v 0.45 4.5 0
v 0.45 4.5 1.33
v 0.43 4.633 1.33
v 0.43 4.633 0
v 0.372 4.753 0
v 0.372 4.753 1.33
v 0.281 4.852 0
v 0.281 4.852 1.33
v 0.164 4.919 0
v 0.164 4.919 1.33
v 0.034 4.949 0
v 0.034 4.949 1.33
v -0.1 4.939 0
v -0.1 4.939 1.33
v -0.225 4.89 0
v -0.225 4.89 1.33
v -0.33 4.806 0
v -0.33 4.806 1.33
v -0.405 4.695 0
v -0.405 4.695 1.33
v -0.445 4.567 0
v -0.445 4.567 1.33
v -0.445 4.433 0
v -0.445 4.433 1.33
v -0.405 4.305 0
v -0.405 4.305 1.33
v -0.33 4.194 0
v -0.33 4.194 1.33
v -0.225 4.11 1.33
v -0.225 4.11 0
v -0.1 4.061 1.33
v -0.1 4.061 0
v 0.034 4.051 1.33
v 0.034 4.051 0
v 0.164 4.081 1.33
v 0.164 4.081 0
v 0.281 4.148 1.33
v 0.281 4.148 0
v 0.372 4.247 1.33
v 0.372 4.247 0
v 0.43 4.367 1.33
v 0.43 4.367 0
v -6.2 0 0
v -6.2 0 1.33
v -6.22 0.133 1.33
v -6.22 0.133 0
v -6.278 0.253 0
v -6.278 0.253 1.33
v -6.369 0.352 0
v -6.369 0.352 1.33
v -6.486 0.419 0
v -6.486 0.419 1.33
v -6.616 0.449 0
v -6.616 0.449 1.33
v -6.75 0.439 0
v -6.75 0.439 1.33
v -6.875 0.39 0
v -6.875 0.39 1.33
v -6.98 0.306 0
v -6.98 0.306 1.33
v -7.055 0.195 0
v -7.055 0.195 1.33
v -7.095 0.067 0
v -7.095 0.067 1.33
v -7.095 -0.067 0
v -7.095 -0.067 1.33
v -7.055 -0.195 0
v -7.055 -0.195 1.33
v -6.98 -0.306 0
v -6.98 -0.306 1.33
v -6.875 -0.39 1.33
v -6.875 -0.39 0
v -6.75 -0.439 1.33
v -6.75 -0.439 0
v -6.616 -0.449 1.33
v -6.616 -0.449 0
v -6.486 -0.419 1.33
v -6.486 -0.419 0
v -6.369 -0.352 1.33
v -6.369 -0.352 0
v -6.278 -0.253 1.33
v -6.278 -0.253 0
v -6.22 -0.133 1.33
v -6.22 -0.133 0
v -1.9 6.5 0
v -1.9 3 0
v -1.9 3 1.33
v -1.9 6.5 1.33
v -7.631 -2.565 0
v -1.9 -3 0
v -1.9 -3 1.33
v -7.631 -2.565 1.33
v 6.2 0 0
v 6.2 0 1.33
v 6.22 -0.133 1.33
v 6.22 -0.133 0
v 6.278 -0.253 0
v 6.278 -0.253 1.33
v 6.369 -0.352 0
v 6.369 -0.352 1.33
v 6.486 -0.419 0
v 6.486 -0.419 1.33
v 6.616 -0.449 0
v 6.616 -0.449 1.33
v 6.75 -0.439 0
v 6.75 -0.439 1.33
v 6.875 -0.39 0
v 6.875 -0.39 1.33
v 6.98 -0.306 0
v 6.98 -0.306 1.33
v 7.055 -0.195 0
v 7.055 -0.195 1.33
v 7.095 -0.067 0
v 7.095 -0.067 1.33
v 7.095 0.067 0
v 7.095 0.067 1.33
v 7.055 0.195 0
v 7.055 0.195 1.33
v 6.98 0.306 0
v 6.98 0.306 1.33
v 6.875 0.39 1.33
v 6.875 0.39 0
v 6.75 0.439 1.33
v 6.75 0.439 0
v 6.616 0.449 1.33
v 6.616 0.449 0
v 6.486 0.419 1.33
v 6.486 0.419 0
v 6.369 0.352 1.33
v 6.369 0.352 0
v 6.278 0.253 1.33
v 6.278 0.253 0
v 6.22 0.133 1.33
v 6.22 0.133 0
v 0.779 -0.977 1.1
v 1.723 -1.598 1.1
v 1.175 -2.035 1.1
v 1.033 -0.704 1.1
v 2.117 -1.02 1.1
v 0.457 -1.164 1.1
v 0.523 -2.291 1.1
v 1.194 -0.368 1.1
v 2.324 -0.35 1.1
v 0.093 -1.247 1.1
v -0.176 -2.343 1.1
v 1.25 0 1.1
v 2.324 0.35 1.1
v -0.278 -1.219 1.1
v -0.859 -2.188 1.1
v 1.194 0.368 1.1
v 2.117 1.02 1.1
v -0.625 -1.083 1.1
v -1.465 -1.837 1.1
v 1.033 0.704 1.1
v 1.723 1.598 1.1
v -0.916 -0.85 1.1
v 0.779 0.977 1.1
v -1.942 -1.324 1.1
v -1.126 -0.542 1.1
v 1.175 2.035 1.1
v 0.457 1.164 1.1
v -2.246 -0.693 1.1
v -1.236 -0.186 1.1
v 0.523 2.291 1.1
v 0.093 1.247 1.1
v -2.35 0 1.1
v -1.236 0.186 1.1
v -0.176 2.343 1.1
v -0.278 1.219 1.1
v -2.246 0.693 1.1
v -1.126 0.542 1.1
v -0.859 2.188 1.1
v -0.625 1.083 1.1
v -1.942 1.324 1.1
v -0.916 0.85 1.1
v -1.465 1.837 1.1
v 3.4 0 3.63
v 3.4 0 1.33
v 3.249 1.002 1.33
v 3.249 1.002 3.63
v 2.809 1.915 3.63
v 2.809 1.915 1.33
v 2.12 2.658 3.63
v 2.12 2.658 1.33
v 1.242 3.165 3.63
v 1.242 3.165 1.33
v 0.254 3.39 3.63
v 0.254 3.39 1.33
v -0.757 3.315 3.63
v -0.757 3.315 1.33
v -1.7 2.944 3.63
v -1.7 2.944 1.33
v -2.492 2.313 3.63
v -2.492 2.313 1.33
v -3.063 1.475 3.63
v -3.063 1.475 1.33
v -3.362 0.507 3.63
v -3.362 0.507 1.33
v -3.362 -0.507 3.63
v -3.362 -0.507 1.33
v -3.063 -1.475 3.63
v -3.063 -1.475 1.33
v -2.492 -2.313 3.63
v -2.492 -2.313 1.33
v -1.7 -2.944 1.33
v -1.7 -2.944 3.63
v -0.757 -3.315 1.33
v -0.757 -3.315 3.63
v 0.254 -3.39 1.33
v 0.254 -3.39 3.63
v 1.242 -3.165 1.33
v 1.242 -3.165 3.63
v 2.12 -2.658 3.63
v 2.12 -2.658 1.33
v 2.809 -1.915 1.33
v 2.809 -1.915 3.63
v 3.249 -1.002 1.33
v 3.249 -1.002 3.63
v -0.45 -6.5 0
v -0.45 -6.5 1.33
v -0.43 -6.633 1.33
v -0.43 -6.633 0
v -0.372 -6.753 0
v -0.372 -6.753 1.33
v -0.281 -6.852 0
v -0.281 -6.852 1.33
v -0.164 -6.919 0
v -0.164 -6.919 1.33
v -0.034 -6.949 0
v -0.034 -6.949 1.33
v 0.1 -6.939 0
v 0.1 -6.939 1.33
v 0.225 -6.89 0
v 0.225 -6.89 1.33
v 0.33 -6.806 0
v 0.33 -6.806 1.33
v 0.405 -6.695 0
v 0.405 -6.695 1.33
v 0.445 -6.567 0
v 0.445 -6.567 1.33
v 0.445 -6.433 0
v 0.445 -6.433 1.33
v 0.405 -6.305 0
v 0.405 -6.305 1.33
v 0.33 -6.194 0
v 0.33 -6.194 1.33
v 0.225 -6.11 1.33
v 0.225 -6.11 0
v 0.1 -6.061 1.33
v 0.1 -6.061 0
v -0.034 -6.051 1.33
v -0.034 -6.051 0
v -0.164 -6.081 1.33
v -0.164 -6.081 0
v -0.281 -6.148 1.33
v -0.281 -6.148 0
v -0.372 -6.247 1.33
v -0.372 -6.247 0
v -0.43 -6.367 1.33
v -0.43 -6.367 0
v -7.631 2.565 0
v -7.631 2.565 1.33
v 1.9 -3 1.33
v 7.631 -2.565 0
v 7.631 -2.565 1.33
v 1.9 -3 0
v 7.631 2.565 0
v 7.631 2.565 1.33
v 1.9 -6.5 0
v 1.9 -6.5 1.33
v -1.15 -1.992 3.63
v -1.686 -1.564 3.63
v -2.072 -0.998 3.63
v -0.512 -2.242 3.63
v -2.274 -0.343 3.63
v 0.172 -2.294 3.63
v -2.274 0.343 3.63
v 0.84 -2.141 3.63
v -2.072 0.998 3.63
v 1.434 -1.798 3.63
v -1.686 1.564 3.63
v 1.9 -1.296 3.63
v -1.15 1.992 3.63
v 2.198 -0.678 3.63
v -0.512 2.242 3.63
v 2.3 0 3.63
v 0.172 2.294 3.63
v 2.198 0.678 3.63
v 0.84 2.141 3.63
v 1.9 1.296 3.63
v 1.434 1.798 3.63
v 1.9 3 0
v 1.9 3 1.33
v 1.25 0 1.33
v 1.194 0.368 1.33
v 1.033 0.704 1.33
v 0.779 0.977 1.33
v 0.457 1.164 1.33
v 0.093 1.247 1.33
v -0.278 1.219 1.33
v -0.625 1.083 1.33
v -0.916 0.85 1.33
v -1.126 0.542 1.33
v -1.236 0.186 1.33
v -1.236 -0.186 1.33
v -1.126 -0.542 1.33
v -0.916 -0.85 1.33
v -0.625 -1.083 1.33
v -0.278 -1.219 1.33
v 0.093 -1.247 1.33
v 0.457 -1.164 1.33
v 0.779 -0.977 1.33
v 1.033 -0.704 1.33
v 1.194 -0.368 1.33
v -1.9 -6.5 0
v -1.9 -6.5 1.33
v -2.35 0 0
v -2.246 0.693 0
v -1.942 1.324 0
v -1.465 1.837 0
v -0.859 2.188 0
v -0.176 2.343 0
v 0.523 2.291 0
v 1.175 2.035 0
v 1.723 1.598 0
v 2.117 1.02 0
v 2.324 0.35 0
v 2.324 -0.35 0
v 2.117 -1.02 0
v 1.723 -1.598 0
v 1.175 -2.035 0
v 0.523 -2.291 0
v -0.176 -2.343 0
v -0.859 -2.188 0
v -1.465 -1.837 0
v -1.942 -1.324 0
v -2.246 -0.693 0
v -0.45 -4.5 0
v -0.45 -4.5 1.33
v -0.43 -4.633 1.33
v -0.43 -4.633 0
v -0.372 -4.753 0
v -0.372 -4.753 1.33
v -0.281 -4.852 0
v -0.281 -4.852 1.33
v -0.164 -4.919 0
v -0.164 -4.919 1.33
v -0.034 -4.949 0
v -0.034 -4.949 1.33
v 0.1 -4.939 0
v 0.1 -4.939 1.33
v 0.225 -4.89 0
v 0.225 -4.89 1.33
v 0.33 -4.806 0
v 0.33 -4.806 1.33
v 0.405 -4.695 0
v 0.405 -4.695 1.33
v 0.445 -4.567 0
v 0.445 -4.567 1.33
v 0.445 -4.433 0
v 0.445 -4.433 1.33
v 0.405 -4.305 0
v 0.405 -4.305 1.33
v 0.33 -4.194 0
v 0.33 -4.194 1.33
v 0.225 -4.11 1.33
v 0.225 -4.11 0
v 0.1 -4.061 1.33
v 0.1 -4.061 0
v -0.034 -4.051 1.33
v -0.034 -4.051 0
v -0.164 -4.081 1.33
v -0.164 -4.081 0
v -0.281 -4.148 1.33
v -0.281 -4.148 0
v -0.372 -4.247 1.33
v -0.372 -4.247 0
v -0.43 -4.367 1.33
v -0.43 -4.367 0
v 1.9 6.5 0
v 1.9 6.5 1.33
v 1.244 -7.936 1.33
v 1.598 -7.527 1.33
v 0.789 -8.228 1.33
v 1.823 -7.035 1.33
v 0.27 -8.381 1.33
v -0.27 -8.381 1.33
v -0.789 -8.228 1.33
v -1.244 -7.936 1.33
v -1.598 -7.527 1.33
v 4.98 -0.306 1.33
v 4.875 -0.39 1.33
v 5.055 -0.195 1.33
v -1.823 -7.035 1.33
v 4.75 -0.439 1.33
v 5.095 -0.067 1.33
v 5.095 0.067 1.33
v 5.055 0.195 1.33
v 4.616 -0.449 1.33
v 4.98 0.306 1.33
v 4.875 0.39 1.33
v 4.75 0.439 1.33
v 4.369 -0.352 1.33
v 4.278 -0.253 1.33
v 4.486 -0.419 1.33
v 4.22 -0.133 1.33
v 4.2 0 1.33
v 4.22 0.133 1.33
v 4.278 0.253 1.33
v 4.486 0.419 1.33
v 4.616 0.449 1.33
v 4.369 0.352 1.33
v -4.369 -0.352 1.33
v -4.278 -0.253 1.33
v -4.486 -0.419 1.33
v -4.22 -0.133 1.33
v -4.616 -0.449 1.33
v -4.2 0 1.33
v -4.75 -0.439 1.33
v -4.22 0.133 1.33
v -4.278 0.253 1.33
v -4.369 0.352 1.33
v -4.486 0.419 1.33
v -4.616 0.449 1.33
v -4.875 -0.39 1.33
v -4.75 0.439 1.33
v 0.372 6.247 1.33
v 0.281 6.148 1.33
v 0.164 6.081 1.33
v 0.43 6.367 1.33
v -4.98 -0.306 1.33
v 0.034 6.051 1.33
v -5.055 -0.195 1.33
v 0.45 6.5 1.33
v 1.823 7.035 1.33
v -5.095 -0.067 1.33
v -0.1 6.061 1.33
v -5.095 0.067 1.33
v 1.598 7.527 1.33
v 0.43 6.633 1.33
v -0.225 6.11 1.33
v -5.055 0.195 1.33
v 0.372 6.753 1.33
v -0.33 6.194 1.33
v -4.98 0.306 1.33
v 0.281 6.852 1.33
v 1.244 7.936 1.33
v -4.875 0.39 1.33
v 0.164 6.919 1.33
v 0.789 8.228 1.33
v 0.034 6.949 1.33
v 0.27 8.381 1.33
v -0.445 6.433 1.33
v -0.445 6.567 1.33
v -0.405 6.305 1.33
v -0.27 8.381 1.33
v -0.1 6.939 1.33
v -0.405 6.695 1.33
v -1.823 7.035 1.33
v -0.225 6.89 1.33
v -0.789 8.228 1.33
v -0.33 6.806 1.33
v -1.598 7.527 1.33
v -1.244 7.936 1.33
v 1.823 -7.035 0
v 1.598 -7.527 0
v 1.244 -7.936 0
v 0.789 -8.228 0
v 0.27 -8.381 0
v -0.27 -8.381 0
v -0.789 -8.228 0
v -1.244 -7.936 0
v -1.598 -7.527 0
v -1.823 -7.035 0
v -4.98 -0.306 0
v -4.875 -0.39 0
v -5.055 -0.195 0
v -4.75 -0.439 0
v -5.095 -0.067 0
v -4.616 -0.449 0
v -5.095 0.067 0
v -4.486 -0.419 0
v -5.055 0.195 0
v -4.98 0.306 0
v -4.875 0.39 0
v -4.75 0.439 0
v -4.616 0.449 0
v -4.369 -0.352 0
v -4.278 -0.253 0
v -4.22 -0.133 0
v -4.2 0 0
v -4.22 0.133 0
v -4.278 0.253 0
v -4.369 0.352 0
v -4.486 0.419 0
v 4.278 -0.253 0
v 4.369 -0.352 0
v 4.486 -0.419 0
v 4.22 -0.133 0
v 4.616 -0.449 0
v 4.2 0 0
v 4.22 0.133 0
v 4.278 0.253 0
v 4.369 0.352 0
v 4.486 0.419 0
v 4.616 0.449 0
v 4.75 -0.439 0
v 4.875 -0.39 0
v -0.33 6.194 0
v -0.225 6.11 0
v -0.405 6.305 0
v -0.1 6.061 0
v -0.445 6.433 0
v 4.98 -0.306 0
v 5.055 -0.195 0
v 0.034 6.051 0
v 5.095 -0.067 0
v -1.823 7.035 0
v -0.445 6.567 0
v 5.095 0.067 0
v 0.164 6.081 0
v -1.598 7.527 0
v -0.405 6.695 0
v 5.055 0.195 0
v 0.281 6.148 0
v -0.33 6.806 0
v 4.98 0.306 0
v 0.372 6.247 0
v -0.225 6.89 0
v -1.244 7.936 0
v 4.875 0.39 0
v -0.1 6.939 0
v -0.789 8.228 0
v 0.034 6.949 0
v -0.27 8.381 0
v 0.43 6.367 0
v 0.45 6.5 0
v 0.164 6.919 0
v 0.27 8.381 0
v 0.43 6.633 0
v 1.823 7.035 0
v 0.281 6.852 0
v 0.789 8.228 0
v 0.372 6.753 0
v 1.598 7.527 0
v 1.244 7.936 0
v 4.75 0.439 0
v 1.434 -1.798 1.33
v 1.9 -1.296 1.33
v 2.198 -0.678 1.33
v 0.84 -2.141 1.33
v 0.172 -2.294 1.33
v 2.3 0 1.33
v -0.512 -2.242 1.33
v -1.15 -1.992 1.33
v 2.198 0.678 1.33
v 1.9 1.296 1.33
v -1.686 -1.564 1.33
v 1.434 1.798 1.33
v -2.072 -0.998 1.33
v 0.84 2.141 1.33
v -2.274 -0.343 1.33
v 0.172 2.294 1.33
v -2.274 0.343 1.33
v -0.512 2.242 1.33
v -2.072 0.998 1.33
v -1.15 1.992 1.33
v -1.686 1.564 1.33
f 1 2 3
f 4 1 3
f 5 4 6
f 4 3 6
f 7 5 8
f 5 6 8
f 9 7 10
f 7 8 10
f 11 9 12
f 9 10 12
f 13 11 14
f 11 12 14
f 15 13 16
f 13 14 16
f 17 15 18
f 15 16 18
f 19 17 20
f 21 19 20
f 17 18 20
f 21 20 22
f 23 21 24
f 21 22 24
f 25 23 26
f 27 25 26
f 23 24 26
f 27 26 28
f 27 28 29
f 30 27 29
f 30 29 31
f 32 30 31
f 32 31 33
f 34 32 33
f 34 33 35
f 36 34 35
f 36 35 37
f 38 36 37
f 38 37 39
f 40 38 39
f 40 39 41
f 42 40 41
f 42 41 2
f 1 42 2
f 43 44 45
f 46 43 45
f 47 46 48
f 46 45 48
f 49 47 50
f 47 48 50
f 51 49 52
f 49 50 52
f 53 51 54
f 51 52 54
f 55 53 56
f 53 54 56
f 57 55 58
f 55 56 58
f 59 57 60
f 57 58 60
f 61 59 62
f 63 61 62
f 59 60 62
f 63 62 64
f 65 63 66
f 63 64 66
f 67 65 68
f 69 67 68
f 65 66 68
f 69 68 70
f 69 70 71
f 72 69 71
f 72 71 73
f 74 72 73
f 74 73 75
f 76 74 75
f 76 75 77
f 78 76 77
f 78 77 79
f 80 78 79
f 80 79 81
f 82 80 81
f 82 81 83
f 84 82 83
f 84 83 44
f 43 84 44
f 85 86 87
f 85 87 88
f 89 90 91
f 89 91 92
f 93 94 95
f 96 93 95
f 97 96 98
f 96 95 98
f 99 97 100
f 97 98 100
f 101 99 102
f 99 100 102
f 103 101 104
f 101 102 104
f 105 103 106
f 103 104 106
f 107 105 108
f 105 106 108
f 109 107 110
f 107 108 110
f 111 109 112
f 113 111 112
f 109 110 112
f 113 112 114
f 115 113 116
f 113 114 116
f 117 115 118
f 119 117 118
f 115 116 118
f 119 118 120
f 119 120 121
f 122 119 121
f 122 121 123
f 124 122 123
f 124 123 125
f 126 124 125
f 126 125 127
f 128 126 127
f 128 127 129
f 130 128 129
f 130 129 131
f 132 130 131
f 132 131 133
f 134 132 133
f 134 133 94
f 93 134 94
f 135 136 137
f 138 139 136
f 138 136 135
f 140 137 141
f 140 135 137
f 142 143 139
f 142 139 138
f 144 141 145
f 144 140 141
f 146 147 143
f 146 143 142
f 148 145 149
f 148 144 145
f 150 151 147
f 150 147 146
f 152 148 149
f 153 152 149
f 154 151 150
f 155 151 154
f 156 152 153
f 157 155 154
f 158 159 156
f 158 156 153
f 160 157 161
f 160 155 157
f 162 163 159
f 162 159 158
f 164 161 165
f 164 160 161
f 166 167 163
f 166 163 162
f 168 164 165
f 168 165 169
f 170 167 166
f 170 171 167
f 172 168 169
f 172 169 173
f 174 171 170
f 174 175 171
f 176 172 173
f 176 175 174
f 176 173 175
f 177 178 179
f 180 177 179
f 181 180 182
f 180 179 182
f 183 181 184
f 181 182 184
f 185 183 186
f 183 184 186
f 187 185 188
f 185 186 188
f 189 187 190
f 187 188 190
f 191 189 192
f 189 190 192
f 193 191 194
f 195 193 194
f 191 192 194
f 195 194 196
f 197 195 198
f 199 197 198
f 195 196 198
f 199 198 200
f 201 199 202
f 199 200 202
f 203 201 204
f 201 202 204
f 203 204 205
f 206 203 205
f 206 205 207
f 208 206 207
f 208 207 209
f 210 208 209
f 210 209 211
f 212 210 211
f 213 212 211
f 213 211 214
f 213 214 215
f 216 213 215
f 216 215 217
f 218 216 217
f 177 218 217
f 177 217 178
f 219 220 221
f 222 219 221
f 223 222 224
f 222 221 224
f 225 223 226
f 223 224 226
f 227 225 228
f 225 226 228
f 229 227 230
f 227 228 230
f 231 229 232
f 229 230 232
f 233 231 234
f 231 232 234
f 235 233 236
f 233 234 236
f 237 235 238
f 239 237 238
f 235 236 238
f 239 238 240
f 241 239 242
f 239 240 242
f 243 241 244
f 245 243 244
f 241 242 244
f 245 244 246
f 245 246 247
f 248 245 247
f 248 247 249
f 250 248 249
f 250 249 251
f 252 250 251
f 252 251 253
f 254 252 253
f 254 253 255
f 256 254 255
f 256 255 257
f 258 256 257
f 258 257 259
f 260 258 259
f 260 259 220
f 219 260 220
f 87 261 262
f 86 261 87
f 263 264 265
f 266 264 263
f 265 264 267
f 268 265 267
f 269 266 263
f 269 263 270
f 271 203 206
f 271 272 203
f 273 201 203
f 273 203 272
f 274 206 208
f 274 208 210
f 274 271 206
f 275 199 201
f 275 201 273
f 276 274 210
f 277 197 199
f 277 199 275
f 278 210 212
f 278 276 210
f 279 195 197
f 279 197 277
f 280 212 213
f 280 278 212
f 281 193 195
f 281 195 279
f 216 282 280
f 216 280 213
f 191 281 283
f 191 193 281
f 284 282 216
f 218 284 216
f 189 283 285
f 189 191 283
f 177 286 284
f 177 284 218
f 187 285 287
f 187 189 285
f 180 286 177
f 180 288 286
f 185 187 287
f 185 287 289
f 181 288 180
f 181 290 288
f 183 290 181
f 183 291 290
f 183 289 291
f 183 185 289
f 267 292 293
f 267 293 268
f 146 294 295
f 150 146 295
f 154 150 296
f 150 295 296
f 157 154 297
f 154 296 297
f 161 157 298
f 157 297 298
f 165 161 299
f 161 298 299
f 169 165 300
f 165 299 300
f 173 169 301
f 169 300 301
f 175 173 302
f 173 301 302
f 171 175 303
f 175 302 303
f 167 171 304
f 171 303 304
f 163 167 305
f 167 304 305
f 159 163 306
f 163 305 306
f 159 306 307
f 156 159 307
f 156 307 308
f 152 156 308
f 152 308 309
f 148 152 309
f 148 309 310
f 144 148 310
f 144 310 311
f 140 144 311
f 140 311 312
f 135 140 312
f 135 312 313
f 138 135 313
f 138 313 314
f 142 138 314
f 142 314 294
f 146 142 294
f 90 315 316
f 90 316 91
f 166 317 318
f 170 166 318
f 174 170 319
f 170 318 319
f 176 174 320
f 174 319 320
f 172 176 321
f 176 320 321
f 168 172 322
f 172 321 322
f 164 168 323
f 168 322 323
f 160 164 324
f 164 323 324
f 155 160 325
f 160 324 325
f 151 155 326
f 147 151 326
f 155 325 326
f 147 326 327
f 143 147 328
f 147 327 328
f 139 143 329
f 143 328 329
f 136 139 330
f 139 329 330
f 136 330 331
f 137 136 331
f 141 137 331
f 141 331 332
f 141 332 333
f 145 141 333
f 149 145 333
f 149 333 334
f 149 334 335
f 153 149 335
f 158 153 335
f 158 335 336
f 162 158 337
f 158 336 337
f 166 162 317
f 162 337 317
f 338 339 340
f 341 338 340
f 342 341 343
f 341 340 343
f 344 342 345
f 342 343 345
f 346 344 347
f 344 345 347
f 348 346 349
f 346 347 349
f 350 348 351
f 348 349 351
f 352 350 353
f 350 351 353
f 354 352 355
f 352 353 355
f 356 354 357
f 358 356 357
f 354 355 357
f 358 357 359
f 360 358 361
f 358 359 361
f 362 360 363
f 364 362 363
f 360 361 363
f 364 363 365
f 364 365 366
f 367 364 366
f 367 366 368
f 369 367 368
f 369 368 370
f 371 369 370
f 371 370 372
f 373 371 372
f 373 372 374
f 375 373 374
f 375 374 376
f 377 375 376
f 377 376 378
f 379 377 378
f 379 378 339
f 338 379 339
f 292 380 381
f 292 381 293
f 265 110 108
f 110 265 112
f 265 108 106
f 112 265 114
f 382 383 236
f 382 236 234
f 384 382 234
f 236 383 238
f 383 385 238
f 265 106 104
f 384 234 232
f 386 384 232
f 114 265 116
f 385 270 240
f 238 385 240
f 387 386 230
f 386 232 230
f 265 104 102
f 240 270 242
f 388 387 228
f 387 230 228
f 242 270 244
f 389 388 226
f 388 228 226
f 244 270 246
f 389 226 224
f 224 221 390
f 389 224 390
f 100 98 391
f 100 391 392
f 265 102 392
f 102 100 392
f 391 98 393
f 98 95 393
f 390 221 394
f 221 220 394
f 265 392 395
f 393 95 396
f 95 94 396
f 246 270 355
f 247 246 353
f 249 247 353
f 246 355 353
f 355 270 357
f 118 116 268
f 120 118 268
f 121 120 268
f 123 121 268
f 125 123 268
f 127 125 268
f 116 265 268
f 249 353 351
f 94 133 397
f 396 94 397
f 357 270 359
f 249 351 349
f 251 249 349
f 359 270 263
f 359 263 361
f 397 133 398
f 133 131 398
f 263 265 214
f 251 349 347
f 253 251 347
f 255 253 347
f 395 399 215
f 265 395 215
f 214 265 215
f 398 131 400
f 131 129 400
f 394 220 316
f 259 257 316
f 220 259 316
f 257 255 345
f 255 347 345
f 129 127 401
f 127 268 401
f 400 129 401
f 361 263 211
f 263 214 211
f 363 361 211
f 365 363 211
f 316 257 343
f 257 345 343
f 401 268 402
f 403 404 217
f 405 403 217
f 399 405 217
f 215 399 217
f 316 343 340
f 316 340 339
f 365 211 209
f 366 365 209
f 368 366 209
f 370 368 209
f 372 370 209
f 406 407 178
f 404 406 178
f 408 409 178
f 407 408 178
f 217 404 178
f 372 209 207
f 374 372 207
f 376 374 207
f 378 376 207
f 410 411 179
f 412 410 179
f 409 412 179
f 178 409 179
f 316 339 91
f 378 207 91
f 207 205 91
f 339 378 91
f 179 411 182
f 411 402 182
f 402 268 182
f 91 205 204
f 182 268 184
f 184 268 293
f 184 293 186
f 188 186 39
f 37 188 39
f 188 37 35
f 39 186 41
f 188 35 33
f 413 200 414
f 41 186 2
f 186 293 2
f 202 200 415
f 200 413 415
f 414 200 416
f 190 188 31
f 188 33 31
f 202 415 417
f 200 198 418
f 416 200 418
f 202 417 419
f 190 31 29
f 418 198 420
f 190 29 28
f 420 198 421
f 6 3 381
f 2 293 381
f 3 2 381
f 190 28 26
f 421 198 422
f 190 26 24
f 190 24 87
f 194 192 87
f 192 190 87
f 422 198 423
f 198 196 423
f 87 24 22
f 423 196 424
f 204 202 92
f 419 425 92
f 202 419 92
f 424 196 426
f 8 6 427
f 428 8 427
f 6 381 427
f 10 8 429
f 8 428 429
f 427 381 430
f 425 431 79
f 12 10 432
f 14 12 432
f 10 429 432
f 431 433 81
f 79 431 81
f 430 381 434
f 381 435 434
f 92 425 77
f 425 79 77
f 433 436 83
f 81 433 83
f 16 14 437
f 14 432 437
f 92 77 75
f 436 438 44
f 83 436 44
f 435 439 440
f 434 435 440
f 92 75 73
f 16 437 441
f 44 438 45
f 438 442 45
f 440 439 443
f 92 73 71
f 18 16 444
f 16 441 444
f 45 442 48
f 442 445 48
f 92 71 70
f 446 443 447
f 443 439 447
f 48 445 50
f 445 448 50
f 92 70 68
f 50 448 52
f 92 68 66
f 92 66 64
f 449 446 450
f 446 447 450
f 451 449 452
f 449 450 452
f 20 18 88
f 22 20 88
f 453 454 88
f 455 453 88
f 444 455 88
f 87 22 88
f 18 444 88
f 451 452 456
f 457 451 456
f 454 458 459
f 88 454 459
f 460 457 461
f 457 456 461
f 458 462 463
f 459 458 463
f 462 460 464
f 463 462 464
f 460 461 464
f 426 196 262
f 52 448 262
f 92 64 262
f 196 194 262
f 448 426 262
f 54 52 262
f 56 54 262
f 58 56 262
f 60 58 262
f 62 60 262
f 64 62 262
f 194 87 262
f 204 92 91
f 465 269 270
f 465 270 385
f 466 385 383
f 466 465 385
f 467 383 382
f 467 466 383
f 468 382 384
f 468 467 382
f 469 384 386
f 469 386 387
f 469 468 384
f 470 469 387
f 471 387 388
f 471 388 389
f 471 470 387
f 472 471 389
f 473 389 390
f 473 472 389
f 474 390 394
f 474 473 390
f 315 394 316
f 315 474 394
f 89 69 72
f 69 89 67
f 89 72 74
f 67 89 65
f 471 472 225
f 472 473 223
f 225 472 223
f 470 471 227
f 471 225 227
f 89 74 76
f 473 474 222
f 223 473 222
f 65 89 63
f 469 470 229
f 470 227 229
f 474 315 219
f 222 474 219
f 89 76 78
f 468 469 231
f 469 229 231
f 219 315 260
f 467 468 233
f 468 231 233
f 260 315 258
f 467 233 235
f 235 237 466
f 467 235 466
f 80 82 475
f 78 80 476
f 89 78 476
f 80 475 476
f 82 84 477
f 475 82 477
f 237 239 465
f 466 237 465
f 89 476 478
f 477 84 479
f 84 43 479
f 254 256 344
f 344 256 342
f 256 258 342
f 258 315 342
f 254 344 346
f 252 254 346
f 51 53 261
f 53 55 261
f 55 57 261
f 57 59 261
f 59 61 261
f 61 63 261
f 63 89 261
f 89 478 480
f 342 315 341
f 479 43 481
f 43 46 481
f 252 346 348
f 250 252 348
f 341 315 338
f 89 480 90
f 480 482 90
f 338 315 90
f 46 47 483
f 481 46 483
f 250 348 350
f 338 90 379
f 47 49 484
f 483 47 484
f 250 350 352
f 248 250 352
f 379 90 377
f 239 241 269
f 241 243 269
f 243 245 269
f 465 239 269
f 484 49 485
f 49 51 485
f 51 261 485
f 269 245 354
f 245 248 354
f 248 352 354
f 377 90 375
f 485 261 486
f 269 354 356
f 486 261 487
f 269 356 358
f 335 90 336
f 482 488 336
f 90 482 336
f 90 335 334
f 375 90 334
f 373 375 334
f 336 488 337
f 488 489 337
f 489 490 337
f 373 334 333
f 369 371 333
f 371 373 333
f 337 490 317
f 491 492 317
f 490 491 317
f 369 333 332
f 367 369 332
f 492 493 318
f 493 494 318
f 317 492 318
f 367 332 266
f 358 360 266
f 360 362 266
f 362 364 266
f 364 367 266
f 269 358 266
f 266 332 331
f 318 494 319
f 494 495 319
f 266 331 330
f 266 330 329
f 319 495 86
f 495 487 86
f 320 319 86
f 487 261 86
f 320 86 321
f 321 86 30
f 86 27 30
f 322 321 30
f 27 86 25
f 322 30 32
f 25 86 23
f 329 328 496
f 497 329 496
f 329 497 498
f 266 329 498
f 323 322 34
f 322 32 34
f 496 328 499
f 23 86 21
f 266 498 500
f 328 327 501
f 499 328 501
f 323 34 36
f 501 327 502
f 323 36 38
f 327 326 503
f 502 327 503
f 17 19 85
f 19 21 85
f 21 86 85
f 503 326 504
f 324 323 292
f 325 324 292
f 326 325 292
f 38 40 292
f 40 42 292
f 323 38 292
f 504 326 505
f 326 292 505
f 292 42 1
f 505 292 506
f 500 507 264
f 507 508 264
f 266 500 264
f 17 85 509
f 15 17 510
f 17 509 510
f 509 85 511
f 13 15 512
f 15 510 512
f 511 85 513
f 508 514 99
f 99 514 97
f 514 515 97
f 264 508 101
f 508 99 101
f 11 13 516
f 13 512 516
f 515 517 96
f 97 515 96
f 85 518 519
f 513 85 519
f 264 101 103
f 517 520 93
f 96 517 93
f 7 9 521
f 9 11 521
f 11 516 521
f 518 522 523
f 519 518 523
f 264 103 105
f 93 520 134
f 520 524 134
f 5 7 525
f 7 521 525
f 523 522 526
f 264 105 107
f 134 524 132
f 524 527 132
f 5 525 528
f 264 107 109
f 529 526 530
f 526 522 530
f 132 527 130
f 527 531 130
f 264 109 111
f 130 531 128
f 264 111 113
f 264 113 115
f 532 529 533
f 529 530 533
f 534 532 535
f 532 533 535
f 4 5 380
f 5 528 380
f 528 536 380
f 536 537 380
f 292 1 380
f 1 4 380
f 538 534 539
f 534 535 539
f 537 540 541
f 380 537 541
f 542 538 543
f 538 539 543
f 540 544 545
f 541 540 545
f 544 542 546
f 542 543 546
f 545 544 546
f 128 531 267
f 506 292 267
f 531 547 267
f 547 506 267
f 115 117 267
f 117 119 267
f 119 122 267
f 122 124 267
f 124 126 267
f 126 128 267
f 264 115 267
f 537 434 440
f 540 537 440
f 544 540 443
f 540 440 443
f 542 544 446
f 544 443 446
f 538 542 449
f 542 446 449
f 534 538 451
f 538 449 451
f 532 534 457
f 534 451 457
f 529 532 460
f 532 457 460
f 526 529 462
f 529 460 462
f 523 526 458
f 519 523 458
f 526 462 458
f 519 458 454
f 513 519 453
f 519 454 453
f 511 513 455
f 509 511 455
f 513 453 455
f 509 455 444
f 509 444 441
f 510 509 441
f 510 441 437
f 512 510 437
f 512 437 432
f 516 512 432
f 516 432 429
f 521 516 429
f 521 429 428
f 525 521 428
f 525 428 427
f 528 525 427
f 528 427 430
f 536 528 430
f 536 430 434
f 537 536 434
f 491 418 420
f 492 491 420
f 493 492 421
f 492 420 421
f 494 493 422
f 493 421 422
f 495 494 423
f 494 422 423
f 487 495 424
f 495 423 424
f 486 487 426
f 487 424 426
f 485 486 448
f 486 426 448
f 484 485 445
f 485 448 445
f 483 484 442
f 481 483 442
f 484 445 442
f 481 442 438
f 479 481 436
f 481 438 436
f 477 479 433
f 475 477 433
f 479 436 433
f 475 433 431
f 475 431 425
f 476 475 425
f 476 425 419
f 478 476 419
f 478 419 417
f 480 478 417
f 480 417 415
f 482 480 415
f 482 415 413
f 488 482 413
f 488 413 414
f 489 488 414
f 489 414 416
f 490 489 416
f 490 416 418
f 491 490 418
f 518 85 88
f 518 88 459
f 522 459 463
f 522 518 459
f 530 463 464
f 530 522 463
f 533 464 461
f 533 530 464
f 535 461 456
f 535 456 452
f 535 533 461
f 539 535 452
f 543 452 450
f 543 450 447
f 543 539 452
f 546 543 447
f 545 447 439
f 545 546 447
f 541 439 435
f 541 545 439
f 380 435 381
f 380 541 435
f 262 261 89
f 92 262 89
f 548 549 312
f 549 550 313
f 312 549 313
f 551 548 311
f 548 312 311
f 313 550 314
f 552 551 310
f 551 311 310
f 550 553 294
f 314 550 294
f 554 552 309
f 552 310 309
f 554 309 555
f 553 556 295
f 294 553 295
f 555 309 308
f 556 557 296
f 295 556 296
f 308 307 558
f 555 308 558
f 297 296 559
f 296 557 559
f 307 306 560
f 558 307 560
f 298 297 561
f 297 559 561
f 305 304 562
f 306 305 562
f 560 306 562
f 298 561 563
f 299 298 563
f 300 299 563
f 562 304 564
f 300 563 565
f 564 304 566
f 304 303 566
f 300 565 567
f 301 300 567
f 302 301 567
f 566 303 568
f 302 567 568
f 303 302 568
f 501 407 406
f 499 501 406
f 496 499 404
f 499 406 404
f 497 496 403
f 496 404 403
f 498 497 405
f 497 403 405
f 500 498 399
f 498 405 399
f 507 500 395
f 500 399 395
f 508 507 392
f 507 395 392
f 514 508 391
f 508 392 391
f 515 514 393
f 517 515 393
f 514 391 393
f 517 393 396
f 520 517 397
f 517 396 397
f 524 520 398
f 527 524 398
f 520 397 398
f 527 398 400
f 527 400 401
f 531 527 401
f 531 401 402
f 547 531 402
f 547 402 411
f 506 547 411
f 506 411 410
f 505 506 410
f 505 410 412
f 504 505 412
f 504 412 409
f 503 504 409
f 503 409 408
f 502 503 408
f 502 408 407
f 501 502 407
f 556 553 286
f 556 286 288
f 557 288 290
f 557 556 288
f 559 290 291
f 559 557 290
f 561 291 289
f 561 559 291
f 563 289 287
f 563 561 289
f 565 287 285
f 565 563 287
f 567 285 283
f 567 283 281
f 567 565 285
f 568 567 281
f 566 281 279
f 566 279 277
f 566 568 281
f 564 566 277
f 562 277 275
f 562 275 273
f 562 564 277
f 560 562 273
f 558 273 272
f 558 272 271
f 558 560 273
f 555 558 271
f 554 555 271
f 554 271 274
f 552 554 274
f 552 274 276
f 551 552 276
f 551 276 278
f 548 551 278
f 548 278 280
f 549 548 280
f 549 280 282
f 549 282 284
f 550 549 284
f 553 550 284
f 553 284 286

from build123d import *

# Parameters (mm, degrees)
AUFSATZ_LINEAR_AUSTRAGEN1_DEPTH      = 1.33
AUFSATZ_LINEAR_AUSTRAGEN2_DEPTH      = 2.3
AUFSATZ_LINEAR_AUSTRAGEN2_DEPTH_BACK = 1.33
SKIZZE2_R                            = 3.4
SKIZZE2_R_2                          = 2.3
SKIZZE3_R                            = 1.25
SCHNITT_LINEAR_AUSTRAGEN1_DEPTH      = 21.470115412
SKIZZE4_R                            = 2.35
SCHNITT_LINEAR_AUSTRAGEN2_DEPTH      = 1.1
SKIZZE5_R                            = 0.45
SCHNITT_LINEAR_AUSTRAGEN3_DEPTH      = 21.470115412
SCHNITT_LINEAR_AUSTRAGEN4_DEPTH      = 1.33


with BuildPart() as part:
    # Skizze1 → Aufsatz-Linear austragen1 (new body)
    with BuildSketch(Plane.XY):
        with BuildLine():
            Line((-16.79191458, 1.869621687), (-1.9, 3))
            Line((-1.9, 3), (-1.9, 6.5))
            ThreePointArc((-1.9, 6.5), (0, 8.4), (1.9, 6.5))
            Line((1.9, 6.5), (1.9, 3))
            Line((1.9, 3), (16.79191458, 1.869621687))
            ThreePointArc((16.79191458, 1.869621687), (18.525, 0), (16.79191458, -1.869621687))
            Line((16.79191458, -1.869621687), (1.9, -3))
            Line((1.9, -3), (1.9, -6.5))
            ThreePointArc((1.9, -6.5), (0, -8.4), (-1.9, -6.5))
            Line((-1.9, -6.5), (-1.9, -3))
            Line((-1.9, -3), (-16.79191458, -1.869621687))
            ThreePointArc((-16.79191458, -1.869621687), (-18.525, 0), (-16.79191458, 1.869621687))
        make_face()
    extrude(amount=AUFSATZ_LINEAR_AUSTRAGEN1_DEPTH)

    # Skizze2 → Aufsatz-Linear austragen2 (add, two sides: drawn at the far end of the back side and taken through both)
    with BuildSketch(Plane.XY.offset(1.33).offset(-AUFSATZ_LINEAR_AUSTRAGEN2_DEPTH_BACK)):
        Circle(SKIZZE2_R)
        Circle(SKIZZE2_R_2, mode=Mode.SUBTRACT)
    extrude(amount=AUFSATZ_LINEAR_AUSTRAGEN2_DEPTH + AUFSATZ_LINEAR_AUSTRAGEN2_DEPTH_BACK)

    # Skizze3 → Schnitt-Linear austragen1 (cut, through all)
    with BuildSketch(Plane.XY.offset(1.33)):
        Circle(SKIZZE3_R)
    extrude(amount=-SCHNITT_LINEAR_AUSTRAGEN1_DEPTH, mode=Mode.SUBTRACT)

    # Skizze4 → Schnitt-Linear austragen2 (cut)
    with BuildSketch(Plane(origin=(0, 0, 0), x_dir=(-1, 0, 0), z_dir=(0, 0, -1))):
        Circle(SKIZZE4_R)
    extrude(amount=-SCHNITT_LINEAR_AUSTRAGEN2_DEPTH, mode=Mode.SUBTRACT)

    # Skizze5 → Schnitt-Linear austragen3 (cut, through all)
    with BuildSketch(Plane.XY.offset(1.33)):
        with Locations((0, 6.5)):
            Circle(SKIZZE5_R)
        with Locations((-16.65, 0)):
            Circle(SKIZZE5_R)
        with Locations((0, 4.5)):
            Circle(SKIZZE5_R)
        with Locations((-14.65, 0)):
            Circle(SKIZZE5_R)
        with Locations((-12.65, 0)):
            Circle(SKIZZE5_R)
        with Locations((-10.65, 0)):
            Circle(SKIZZE5_R)
        with Locations((-8.65, 0)):
            Circle(SKIZZE5_R)
        with Locations((-6.65, 0)):
            Circle(SKIZZE5_R)
        with Locations((-4.65, 0)):
            Circle(SKIZZE5_R)
        with Locations(Location((0, -4.5, 0), (0, 0, 180))):
            Circle(SKIZZE5_R)
        with Locations(Location((0, -6.5, 0), (0, 0, 180))):
            Circle(SKIZZE5_R)
        with Locations(Location((4.65, 0, 0), (0, 0, 180))):
            Circle(SKIZZE5_R)
        with Locations(Location((6.65, 0, 0), (0, 0, 180))):
            Circle(SKIZZE5_R)
        with Locations(Location((8.65, 0, 0), (0, 0, 180))):
            Circle(SKIZZE5_R)
        with Locations(Location((10.65, 0, 0), (0, 0, 180))):
            Circle(SKIZZE5_R)
        with Locations(Location((12.65, 0, 0), (0, 0, 180))):
            Circle(SKIZZE5_R)
        with Locations(Location((14.65, 0, 0), (0, 0, 180))):
            Circle(SKIZZE5_R)
        with Locations(Location((16.65, 0, 0), (0, 0, 180))):
            Circle(SKIZZE5_R)
    extrude(amount=-SCHNITT_LINEAR_AUSTRAGEN3_DEPTH, mode=Mode.SUBTRACT)

    # Skizze6 → Schnitt-Linear austragen4 (cut)
    with BuildSketch(Plane(origin=(0, 0, 0), x_dir=(-1, 0, 0), z_dir=(0, 0, -1))):
        Polygon((-7.630661654, -0.069500342), (-7.630661654, 5.641889325), (-18.981826271, 5.641889325), (-18.981826271, -4.018658181), (-7.630661654, -4.018658181), align=None)
        Polygon((7.630661654, -4.018658181), (7.630661654, -0.069500342), (7.630661654, 5.641889325), (18.981826271, 5.641889325), (18.981826271, -4.018658181), align=None)
    extrude(amount=-SCHNITT_LINEAR_AUSTRAGEN4_DEPTH, mode=Mode.SUBTRACT)


solid = part.part
